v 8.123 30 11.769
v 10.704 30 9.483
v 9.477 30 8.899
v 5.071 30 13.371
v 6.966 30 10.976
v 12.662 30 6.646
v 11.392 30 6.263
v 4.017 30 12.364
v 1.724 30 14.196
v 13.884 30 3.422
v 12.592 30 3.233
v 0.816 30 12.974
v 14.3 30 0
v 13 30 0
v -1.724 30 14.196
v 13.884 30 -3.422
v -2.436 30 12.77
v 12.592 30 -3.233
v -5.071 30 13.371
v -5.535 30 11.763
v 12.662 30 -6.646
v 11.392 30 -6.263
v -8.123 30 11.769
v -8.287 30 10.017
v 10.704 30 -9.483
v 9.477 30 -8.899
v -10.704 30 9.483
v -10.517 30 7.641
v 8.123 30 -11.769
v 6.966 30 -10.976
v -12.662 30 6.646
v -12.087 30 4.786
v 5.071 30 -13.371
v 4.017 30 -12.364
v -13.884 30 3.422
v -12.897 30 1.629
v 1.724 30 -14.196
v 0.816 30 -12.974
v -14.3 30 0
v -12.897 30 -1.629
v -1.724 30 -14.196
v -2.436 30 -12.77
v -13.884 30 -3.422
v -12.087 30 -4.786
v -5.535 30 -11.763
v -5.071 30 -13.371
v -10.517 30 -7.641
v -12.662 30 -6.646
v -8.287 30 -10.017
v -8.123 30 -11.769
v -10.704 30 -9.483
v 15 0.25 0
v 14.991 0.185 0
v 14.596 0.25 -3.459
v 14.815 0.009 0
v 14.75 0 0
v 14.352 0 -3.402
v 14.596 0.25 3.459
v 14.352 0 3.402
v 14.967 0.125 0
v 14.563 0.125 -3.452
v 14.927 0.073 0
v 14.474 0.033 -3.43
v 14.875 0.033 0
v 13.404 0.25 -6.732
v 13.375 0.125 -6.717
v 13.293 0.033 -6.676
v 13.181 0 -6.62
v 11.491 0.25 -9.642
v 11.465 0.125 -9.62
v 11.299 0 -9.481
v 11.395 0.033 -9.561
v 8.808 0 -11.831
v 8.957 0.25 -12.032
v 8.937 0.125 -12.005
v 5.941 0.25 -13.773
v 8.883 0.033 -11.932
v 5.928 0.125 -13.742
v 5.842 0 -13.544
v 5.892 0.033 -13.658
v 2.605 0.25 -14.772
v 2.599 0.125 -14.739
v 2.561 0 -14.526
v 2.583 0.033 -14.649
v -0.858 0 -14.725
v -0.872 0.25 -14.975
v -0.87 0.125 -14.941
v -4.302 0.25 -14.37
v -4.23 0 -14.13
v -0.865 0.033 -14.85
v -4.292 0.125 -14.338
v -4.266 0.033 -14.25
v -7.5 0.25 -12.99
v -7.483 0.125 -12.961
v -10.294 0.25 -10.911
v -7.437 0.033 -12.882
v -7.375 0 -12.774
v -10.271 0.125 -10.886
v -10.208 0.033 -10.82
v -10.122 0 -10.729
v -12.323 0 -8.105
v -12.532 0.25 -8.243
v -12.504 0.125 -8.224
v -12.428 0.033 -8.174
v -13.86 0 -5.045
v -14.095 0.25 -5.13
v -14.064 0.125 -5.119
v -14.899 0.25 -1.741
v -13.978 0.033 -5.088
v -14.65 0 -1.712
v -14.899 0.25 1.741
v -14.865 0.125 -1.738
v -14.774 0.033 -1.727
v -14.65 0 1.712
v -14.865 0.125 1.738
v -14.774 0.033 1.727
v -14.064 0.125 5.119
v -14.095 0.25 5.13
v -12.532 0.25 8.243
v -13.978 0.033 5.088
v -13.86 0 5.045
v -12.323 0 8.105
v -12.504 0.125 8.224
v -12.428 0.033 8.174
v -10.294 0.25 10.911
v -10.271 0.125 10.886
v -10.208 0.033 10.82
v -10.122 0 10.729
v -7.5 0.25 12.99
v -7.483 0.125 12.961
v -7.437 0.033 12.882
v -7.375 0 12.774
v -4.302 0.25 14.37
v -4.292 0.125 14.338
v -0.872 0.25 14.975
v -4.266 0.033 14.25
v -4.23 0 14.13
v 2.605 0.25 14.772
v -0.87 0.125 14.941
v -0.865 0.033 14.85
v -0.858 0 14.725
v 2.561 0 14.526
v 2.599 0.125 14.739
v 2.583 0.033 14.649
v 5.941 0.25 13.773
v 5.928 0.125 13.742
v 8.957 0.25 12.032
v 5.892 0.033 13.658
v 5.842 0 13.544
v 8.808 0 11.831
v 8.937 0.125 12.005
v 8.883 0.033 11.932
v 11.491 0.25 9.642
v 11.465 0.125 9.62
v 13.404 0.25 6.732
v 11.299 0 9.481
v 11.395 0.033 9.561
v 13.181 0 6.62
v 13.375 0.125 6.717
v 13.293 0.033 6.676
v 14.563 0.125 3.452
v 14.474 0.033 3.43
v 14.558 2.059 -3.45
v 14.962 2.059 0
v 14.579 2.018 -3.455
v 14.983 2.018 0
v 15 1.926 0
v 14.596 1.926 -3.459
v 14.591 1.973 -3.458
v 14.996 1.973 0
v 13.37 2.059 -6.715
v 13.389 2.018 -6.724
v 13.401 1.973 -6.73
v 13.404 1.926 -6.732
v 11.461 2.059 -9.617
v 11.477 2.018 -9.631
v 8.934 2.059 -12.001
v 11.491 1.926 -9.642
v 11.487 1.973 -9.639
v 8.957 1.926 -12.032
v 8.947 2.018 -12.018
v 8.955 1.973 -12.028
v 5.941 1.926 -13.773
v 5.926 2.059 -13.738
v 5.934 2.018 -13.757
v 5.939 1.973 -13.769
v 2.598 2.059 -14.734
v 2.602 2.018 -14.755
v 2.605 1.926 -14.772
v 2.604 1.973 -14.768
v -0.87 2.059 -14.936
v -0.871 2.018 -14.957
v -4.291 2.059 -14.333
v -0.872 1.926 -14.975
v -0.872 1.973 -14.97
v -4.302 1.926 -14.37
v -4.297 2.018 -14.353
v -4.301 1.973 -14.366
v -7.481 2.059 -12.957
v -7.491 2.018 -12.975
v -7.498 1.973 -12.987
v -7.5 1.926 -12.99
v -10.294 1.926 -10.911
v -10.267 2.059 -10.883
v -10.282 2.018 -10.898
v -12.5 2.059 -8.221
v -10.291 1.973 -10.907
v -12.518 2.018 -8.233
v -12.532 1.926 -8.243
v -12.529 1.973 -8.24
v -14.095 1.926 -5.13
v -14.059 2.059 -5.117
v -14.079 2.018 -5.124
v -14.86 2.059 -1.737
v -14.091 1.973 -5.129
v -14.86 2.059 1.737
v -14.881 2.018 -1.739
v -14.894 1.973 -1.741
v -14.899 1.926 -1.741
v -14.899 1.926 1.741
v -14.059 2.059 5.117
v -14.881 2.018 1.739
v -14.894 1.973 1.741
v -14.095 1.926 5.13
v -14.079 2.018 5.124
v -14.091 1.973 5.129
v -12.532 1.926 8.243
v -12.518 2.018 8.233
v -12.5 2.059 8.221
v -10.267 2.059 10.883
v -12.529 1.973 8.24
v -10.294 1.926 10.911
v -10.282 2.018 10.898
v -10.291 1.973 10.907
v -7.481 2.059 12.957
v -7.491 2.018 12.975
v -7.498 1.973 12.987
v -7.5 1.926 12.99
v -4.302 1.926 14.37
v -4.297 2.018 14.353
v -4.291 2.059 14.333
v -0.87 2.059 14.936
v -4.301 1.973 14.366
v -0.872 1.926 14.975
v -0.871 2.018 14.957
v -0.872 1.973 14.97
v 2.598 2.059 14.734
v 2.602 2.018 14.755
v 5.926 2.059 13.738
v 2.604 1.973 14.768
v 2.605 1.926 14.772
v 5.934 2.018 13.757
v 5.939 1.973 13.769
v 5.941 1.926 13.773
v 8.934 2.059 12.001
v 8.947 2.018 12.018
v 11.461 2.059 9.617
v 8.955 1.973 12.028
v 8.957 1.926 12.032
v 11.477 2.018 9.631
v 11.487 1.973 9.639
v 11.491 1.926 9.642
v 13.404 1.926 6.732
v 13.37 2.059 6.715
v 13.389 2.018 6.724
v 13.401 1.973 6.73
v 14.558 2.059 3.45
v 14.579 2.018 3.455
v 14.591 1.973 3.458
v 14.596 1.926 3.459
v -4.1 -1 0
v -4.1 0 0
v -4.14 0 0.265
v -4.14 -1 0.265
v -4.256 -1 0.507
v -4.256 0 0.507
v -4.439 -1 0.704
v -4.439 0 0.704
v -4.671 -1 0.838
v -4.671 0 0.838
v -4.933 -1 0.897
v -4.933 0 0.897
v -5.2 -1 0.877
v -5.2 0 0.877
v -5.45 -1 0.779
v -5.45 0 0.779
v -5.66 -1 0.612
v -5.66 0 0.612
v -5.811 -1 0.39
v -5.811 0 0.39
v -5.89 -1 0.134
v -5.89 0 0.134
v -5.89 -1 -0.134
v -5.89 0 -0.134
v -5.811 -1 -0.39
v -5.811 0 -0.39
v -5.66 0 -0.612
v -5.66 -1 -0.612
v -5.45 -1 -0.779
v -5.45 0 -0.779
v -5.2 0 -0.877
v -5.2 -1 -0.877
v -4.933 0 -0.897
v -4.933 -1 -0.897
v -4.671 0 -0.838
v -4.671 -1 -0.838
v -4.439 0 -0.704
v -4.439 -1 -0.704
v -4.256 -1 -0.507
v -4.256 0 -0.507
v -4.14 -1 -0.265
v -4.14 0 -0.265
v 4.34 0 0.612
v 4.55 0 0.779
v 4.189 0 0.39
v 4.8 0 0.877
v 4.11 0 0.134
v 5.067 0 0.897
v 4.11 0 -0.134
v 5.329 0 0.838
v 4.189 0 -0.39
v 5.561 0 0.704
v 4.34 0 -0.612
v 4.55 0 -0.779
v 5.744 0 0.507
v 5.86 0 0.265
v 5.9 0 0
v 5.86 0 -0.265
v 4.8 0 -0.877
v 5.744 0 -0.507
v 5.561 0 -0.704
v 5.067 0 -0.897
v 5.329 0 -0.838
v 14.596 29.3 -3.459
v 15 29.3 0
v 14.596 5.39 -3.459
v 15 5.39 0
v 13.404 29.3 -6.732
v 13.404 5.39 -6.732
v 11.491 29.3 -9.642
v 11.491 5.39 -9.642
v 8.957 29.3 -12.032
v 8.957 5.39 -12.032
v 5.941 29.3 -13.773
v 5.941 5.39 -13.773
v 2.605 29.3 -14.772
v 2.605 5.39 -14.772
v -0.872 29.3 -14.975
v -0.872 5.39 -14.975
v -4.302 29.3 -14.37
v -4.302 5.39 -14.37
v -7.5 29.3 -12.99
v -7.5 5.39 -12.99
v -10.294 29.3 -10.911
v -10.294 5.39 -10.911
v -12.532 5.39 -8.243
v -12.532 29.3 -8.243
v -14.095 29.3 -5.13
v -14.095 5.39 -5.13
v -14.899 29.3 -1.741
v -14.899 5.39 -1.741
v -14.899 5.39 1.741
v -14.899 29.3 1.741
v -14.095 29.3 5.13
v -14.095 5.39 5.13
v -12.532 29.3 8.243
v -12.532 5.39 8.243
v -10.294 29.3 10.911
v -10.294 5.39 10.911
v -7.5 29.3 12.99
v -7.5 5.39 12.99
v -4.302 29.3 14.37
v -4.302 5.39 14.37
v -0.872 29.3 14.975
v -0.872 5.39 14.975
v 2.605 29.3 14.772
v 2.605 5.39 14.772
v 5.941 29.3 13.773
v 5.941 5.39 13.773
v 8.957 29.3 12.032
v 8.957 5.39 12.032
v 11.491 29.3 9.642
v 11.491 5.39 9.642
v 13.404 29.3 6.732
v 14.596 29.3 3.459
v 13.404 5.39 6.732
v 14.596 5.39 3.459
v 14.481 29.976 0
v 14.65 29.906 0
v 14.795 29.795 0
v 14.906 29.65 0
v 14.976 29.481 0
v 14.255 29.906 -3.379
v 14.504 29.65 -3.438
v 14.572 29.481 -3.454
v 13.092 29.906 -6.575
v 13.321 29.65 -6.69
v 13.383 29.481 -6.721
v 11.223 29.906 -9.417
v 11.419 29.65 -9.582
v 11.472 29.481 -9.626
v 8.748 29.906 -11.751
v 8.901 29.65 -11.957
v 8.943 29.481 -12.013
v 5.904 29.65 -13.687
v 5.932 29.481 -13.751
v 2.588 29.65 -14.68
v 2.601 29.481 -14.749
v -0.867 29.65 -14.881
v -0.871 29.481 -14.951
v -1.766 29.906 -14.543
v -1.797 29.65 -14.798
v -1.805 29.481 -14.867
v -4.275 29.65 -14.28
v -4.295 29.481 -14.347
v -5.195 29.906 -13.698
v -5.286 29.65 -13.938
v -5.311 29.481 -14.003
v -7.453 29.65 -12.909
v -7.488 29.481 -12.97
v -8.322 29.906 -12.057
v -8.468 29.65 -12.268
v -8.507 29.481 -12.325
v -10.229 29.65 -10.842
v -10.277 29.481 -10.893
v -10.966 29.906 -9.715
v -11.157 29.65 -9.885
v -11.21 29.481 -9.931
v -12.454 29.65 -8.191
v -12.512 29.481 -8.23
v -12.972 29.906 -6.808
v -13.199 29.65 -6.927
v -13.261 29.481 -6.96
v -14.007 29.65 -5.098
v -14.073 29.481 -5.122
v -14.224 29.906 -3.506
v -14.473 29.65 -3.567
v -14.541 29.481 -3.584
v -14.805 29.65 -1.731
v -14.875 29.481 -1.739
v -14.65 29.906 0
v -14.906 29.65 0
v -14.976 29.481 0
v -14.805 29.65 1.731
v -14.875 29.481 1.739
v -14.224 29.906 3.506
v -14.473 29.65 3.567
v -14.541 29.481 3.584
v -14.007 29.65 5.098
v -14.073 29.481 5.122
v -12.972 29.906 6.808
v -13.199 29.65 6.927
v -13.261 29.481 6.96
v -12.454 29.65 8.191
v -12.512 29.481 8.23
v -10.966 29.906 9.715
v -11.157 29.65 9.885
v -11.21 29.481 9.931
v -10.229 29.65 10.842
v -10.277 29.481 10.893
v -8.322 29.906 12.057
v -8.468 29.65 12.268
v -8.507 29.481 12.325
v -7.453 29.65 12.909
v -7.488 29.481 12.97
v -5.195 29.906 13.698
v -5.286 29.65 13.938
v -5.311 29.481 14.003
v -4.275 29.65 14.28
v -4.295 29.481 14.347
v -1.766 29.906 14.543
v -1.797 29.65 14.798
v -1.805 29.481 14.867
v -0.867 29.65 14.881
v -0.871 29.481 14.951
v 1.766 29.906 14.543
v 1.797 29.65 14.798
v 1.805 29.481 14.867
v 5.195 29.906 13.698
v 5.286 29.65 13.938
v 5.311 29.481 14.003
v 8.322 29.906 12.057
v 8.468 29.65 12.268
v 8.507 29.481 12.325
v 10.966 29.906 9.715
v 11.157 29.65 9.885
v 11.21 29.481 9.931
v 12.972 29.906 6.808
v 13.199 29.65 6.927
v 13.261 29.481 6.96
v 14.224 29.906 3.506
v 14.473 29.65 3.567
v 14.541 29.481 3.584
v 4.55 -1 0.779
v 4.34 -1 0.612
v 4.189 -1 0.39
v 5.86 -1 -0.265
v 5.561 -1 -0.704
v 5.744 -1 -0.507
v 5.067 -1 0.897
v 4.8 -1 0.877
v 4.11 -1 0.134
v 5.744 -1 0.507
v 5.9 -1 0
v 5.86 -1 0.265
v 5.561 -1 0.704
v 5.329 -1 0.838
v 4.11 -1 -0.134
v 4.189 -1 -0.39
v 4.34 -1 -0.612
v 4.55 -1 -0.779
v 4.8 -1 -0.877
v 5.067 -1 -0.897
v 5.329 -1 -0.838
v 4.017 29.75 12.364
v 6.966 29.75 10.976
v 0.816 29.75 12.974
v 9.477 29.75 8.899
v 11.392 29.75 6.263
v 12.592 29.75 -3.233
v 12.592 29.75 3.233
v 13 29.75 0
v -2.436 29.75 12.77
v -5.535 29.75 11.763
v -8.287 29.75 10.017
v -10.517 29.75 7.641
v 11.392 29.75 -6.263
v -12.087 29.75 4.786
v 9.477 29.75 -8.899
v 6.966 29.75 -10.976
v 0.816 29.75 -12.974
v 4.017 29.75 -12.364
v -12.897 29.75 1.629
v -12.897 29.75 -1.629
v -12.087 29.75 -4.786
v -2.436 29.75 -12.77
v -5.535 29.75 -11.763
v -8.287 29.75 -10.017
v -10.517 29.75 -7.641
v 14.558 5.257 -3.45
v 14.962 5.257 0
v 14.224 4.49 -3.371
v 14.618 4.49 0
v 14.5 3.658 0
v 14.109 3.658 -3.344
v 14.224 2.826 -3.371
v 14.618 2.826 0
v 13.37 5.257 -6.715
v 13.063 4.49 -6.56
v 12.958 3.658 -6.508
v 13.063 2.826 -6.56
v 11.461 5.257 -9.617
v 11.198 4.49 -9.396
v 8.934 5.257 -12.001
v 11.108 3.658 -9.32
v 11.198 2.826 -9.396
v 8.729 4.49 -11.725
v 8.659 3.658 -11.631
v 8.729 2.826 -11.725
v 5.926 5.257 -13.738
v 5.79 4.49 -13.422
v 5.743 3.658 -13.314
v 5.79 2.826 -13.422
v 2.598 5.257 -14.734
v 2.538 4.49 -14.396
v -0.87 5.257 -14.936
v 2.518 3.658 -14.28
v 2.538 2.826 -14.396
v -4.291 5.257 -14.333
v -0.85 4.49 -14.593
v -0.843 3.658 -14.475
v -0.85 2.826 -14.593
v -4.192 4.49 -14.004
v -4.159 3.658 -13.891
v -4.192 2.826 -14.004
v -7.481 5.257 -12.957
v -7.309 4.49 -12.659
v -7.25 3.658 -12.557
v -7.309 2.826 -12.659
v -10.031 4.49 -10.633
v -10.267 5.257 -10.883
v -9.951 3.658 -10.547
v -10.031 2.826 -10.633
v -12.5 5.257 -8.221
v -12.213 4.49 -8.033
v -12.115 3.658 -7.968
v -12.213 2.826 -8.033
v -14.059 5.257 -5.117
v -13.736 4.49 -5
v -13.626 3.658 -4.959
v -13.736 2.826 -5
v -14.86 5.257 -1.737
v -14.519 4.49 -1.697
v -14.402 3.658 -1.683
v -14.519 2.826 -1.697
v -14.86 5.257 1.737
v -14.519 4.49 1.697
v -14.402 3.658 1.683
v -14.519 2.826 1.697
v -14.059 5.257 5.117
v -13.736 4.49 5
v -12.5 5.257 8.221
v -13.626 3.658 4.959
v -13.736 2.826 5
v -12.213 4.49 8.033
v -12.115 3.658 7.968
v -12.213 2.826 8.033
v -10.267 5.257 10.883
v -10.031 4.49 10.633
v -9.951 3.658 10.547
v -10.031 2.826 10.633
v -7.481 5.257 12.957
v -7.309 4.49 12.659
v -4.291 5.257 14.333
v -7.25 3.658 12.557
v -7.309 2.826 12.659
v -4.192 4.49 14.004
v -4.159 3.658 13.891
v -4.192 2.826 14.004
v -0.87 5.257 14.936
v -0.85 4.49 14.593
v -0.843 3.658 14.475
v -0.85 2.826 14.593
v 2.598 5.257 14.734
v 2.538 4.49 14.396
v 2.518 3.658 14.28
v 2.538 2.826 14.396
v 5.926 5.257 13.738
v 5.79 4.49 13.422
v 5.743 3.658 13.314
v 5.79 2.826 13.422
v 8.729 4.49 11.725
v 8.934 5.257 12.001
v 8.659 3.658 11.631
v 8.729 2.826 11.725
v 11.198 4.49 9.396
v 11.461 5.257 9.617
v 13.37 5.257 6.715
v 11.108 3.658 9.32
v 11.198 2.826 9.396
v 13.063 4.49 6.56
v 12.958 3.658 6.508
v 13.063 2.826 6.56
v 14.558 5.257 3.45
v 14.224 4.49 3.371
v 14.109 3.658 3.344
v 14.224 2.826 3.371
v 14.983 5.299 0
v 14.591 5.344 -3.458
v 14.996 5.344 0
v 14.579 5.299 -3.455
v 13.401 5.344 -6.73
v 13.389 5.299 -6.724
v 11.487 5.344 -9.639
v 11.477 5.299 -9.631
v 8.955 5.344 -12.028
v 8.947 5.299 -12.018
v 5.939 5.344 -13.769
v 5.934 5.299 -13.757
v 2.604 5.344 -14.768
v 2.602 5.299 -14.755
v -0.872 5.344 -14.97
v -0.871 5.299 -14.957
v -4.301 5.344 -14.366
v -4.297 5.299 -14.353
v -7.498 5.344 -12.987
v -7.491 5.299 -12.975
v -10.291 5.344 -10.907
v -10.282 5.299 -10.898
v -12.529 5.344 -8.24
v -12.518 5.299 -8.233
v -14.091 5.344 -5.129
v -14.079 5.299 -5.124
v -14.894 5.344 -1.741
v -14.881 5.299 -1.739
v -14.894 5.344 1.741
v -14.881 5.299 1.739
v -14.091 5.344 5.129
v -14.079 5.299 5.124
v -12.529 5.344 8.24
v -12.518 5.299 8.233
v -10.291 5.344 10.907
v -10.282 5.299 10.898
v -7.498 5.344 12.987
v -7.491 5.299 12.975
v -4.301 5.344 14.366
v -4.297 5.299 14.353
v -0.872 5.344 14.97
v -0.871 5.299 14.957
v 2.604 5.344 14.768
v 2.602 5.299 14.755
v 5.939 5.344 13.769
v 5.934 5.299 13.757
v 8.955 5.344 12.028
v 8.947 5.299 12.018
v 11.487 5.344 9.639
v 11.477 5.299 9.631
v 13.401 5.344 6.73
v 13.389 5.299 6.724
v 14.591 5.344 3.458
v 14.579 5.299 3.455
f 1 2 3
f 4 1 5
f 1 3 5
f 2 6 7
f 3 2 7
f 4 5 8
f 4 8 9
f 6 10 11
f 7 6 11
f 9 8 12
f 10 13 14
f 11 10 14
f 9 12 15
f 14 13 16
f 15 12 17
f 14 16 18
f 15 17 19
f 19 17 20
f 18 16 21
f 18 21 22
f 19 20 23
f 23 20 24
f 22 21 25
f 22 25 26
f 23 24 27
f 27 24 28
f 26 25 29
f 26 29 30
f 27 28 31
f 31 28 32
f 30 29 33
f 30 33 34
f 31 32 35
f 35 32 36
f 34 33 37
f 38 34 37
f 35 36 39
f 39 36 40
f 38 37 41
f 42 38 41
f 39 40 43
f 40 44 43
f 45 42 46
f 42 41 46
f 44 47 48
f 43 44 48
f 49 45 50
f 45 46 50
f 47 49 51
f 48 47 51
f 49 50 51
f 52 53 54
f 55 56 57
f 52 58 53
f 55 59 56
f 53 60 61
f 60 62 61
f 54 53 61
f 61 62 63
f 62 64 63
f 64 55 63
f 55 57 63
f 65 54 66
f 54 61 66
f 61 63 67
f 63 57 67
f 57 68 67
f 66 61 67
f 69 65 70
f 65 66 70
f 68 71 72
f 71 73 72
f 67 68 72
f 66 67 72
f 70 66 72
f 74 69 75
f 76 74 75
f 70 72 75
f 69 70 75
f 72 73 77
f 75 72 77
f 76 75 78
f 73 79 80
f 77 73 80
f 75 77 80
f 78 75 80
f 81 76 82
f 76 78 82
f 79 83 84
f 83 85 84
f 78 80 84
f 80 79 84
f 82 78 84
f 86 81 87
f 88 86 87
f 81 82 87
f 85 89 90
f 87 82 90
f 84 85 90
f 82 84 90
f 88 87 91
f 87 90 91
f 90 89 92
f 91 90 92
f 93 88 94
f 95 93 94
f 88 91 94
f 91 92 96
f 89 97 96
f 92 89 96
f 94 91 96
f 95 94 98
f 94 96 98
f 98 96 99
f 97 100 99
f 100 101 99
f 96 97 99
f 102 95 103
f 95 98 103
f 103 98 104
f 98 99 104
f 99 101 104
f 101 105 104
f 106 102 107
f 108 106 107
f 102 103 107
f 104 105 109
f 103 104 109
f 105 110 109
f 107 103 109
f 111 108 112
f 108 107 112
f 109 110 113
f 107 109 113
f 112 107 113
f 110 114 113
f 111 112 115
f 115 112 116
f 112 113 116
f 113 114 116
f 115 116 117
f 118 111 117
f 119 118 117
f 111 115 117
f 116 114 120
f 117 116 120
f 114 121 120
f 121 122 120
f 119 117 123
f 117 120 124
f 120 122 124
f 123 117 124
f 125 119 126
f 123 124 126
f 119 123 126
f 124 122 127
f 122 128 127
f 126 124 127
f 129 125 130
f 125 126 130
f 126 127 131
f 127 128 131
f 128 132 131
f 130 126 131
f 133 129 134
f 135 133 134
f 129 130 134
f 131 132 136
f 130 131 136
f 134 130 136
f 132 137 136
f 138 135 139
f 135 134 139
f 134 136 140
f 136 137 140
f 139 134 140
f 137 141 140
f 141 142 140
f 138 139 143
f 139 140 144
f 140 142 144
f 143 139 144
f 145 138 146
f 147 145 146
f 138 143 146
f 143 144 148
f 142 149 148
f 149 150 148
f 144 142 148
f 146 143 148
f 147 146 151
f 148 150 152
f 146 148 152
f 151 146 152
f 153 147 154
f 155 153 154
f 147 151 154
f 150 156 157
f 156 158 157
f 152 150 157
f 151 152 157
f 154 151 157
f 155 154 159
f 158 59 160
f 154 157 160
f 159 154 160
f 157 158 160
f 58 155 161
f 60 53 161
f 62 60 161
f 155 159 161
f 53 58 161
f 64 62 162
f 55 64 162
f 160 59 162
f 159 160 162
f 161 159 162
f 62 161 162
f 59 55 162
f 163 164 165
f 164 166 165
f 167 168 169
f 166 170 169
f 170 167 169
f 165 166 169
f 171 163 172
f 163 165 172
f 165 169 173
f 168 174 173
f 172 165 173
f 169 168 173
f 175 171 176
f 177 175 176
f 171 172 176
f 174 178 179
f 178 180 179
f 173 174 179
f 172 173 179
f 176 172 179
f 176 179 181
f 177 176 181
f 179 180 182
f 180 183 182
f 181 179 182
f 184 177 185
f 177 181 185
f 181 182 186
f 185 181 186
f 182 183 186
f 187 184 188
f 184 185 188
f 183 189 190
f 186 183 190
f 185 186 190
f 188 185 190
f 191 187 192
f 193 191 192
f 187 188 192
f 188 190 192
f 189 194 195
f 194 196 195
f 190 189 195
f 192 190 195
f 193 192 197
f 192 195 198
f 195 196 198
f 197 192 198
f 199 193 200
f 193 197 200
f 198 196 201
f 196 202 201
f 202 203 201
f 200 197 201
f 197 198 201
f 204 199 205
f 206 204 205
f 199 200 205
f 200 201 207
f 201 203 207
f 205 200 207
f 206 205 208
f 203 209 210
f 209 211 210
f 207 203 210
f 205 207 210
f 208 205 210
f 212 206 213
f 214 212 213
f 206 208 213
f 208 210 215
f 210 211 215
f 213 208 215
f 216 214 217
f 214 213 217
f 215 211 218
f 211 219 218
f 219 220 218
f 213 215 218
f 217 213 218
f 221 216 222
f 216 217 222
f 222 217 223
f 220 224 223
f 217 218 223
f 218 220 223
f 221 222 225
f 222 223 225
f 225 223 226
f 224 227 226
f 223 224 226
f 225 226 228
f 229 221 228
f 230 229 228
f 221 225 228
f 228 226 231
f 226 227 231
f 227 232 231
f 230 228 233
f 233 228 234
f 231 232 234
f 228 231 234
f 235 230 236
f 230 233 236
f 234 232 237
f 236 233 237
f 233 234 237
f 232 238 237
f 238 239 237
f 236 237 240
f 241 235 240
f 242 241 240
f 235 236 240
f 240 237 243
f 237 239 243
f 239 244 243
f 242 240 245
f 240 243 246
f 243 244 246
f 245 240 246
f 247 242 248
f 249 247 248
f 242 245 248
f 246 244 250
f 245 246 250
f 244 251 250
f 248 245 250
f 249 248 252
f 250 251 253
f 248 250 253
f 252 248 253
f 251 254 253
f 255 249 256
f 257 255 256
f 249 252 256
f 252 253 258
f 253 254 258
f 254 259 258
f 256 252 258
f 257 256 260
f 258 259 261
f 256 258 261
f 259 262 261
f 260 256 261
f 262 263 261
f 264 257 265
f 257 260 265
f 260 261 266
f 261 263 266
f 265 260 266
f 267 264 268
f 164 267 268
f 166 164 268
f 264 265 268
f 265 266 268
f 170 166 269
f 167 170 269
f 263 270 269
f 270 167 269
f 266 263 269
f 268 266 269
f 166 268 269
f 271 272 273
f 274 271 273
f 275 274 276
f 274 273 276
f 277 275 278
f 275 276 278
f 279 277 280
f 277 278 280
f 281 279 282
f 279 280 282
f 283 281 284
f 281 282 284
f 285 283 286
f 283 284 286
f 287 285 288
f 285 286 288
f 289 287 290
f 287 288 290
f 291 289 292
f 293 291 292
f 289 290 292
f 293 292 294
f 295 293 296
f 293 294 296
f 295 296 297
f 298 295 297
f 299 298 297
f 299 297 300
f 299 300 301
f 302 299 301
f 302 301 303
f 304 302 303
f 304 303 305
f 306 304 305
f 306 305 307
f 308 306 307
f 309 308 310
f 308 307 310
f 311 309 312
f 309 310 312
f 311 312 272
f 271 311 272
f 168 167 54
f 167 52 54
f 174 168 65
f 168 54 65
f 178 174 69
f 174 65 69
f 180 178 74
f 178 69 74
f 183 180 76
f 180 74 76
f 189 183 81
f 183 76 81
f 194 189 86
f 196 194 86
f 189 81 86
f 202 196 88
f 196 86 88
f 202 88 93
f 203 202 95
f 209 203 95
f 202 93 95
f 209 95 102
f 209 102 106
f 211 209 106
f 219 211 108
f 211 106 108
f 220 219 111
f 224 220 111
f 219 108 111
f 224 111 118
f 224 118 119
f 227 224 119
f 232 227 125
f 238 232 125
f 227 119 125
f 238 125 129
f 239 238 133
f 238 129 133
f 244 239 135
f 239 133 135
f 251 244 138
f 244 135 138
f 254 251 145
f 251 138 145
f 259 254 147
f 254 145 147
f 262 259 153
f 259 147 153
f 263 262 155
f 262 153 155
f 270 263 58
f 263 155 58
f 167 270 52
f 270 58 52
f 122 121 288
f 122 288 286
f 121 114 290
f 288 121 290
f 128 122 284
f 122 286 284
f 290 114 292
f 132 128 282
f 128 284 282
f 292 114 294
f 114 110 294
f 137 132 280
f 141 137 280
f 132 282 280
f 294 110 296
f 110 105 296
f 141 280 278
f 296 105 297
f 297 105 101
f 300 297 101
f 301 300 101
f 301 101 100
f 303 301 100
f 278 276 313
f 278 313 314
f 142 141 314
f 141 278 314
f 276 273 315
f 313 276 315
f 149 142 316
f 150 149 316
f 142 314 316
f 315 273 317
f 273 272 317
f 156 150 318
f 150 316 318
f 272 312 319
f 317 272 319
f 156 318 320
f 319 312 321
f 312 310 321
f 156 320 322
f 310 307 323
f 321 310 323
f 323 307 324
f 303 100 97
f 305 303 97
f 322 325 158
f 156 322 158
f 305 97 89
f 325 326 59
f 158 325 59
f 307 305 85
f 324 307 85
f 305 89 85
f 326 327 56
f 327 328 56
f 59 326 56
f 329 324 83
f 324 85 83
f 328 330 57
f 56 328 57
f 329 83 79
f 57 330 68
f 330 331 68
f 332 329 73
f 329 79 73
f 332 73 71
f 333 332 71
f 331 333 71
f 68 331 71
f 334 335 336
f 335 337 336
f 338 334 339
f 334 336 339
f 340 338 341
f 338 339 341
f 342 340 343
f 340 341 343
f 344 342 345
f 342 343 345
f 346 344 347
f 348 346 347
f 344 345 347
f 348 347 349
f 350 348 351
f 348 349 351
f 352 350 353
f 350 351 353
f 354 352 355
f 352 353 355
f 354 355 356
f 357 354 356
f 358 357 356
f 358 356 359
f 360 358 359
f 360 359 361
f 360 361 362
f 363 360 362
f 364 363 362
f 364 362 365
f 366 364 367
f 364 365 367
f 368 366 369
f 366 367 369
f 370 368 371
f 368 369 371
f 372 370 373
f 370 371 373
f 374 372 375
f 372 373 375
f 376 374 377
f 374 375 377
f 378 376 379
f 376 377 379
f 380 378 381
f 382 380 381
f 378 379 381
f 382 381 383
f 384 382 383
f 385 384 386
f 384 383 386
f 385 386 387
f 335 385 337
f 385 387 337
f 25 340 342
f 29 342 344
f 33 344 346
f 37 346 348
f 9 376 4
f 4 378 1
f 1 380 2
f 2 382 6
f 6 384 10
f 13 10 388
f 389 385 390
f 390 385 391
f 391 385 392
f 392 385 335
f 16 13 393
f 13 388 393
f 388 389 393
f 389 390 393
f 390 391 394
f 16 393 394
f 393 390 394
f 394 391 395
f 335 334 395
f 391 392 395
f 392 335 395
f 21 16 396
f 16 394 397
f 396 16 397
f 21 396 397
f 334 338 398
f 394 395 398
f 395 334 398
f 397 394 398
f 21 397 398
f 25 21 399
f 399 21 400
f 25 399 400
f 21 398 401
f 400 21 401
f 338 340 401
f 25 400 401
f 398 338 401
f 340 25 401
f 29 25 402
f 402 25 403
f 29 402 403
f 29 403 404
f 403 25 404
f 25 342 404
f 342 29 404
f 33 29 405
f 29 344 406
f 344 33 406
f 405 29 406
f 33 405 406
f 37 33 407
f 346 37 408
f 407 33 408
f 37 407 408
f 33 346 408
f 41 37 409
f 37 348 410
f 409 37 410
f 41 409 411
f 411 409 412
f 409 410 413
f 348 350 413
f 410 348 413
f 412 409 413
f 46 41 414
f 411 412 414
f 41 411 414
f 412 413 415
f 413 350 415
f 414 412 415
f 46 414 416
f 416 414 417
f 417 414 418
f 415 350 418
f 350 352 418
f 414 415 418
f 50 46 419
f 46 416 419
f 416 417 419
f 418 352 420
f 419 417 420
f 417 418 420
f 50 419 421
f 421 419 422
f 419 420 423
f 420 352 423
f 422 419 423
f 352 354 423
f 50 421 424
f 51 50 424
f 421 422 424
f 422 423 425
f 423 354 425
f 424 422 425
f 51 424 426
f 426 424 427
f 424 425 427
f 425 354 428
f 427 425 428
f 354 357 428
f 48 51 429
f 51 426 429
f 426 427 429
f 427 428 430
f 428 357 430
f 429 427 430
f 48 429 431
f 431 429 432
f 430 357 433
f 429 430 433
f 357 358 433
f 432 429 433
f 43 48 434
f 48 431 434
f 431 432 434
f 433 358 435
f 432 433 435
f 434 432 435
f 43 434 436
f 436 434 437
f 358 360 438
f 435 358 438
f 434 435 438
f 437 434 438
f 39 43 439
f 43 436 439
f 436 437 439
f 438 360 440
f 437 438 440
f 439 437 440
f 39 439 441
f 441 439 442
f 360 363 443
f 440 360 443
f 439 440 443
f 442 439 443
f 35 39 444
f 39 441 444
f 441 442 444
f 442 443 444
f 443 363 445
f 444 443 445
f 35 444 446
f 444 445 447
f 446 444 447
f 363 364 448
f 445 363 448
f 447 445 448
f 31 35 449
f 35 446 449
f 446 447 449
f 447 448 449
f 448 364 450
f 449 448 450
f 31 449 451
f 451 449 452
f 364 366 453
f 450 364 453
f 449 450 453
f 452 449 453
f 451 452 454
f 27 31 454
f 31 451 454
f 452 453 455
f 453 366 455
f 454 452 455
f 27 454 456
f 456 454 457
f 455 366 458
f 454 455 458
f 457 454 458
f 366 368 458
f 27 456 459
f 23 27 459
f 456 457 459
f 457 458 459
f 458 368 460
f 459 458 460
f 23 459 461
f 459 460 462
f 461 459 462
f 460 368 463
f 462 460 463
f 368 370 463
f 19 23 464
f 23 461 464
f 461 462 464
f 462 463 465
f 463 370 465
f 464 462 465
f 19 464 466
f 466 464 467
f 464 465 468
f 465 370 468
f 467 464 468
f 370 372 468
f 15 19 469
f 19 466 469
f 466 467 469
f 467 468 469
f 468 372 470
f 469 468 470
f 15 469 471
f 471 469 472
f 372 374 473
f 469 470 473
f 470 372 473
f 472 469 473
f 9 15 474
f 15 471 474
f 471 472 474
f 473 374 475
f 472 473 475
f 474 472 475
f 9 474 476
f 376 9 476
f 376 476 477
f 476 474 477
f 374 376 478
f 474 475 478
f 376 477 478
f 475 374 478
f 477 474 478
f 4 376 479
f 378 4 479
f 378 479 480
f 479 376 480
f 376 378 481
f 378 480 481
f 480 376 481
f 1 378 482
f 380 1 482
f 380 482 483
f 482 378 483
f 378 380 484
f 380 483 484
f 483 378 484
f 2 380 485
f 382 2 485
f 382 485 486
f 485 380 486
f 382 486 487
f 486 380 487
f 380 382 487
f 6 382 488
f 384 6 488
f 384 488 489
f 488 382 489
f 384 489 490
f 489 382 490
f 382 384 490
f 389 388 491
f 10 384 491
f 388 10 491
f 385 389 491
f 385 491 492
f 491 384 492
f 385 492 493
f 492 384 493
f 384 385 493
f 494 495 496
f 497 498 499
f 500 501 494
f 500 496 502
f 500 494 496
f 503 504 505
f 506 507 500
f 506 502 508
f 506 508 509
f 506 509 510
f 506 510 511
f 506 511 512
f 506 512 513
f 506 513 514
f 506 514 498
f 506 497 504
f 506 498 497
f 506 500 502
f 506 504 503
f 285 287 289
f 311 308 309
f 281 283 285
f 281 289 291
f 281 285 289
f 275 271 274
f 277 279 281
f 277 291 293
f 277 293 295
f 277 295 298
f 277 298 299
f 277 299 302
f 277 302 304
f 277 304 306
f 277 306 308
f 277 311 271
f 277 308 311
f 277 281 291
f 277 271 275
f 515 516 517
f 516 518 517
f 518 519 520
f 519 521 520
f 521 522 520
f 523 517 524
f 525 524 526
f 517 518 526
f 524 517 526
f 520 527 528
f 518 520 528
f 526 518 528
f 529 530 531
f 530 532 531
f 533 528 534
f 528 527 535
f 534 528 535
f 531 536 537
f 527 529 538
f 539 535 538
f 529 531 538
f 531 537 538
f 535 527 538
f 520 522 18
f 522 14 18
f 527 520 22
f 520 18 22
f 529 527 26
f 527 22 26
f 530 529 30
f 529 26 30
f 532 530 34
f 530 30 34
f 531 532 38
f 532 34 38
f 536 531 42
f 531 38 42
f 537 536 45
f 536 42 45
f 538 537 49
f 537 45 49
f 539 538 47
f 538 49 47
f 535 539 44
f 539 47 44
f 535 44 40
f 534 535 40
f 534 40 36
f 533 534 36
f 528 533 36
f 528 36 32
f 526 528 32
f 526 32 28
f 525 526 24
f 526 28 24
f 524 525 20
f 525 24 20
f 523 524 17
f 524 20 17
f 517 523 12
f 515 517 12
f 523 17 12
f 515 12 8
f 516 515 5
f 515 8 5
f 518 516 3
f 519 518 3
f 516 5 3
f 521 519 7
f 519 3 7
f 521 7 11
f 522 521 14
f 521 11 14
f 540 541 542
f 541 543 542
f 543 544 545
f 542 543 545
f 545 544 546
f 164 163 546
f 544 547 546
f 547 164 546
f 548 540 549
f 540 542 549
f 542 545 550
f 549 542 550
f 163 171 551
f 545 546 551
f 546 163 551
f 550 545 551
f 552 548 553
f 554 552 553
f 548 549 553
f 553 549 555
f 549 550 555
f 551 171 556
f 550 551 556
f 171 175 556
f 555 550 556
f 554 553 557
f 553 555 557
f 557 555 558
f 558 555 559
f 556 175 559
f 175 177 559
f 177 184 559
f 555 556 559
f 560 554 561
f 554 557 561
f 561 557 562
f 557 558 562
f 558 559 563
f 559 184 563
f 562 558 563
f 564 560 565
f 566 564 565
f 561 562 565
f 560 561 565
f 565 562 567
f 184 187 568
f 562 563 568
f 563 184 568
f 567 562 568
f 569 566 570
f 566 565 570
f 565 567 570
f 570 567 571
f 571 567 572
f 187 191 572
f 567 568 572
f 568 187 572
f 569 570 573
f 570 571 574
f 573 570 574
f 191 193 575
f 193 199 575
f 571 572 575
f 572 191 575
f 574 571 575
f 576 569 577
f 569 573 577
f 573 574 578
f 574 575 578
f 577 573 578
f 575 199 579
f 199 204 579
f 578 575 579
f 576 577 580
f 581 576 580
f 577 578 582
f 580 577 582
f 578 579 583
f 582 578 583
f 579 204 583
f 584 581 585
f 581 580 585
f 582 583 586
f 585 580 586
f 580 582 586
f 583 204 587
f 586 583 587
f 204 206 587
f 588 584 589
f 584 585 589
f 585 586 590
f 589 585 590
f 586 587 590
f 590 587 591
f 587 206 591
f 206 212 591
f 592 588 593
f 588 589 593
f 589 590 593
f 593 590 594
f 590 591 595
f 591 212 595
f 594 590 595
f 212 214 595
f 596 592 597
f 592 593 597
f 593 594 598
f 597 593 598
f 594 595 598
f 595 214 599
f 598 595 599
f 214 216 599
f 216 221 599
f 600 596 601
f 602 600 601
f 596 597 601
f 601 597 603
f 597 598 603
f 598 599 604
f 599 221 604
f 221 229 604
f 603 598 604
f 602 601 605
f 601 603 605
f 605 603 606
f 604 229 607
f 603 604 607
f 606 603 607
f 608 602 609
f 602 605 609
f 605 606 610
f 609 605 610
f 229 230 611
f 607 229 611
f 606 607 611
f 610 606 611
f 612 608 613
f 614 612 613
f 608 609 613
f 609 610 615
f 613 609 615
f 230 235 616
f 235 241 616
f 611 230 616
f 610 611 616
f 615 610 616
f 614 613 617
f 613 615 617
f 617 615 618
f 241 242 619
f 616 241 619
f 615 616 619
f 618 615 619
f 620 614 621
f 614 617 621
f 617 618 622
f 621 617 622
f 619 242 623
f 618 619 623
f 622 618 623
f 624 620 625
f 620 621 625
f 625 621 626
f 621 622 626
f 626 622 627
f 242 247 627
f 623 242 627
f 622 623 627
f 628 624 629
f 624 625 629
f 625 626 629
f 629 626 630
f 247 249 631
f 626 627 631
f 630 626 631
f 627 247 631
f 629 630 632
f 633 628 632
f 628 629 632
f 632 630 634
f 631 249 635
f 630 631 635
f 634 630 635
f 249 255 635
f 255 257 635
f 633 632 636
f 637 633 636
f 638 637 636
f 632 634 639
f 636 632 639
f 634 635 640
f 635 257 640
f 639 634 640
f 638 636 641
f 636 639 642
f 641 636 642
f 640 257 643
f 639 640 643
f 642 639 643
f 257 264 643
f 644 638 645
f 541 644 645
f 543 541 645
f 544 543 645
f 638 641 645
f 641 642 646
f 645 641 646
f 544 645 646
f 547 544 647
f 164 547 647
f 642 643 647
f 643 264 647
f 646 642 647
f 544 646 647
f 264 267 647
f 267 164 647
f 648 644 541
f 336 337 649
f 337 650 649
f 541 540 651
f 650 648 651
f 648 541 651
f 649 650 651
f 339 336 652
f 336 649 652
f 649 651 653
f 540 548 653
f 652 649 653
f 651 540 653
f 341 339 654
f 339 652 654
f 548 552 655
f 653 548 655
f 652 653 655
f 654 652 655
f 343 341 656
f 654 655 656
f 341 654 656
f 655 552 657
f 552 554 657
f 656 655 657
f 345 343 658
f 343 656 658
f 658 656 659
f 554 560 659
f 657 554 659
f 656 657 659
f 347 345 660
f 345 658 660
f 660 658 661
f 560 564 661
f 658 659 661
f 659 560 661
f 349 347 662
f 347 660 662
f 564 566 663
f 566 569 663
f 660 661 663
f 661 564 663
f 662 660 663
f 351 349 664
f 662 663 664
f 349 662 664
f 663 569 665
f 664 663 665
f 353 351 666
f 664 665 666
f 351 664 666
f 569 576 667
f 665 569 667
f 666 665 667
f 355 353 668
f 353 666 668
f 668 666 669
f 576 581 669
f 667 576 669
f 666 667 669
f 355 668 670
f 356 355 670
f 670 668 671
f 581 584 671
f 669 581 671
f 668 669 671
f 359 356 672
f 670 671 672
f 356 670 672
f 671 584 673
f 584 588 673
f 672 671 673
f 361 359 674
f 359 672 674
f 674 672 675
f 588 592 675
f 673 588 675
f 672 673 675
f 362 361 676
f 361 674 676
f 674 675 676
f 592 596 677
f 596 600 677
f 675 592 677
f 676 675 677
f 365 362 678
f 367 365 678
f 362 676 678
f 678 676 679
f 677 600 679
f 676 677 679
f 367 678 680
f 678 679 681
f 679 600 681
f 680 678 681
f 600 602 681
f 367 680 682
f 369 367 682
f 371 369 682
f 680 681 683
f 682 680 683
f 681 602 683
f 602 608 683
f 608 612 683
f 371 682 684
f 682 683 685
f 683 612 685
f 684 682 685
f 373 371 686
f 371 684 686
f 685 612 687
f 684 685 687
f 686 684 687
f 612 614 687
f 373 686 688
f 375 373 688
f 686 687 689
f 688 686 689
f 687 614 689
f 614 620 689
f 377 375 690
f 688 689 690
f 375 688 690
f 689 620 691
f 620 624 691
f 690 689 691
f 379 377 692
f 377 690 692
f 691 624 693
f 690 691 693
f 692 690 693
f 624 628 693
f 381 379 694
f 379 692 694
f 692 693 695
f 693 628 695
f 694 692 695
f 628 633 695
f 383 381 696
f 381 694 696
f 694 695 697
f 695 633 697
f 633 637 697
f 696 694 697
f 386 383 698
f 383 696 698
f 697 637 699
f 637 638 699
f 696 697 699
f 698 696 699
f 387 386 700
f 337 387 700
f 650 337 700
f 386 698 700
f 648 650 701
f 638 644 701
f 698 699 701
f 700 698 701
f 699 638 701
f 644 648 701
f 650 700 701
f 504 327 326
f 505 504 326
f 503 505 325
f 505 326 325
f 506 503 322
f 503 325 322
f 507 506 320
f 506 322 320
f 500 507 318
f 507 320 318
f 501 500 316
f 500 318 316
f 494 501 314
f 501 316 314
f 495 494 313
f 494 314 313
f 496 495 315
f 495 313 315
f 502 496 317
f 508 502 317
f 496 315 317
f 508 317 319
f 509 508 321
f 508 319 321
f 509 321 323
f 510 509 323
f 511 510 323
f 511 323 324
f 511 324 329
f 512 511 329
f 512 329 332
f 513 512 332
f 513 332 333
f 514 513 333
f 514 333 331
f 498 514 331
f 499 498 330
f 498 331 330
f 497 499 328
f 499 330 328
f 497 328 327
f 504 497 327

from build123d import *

# Parameters (mm, degrees)
SKETCH4_R           = 0.9
BOSS_EXTRUDE1_DEPTH = 1


with BuildPart() as part:
    # Sketch1 → Revolve1 (revolve)
    with BuildSketch(Plane.XY):
        with BuildLine():
            Line((0, 29.75), (13, 29.75))
            Line((13, 29.75), (13, 30))
            Line((13, 30), (14.3, 30))
            ThreePointArc((14.3, 30), (14.794974747, 29.794974747), (15, 29.3))
            Line((15, 29.3), (15, 5.390363203))
            ThreePointArc((15, 5.390363203), (14.990192231, 5.321025678), (14.961538462, 5.257128525))
            ThreePointArc((14.961538462, 5.257128525), (14.5, 3.658312395), (14.961538462, 2.059496265))
            ThreePointArc((14.961538462, 2.059496265), (14.990192231, 1.995599112), (15, 1.926261588))
            Line((15, 1.926261588), (15, 0.25))
            ThreePointArc((15, 0.25), (14.926776695, 0.073223305), (14.75, 0))
            Line((14.75, 0), (0, 0))
            Line((0, 0), (0, 29.75))
        make_face()
    revolve(axis=Axis((0, 0, 0), (0, 1, 0)))

    # Sketch4 → Boss-Extrude1 (add)
    with BuildSketch(Plane.XZ):
        with Locations((5, 0)):
            Circle(SKETCH4_R)
        with Locations((-5, 0)):
            Circle(SKETCH4_R)
    extrude(amount=BOSS_EXTRUDE1_DEPTH)


solid = part.part
